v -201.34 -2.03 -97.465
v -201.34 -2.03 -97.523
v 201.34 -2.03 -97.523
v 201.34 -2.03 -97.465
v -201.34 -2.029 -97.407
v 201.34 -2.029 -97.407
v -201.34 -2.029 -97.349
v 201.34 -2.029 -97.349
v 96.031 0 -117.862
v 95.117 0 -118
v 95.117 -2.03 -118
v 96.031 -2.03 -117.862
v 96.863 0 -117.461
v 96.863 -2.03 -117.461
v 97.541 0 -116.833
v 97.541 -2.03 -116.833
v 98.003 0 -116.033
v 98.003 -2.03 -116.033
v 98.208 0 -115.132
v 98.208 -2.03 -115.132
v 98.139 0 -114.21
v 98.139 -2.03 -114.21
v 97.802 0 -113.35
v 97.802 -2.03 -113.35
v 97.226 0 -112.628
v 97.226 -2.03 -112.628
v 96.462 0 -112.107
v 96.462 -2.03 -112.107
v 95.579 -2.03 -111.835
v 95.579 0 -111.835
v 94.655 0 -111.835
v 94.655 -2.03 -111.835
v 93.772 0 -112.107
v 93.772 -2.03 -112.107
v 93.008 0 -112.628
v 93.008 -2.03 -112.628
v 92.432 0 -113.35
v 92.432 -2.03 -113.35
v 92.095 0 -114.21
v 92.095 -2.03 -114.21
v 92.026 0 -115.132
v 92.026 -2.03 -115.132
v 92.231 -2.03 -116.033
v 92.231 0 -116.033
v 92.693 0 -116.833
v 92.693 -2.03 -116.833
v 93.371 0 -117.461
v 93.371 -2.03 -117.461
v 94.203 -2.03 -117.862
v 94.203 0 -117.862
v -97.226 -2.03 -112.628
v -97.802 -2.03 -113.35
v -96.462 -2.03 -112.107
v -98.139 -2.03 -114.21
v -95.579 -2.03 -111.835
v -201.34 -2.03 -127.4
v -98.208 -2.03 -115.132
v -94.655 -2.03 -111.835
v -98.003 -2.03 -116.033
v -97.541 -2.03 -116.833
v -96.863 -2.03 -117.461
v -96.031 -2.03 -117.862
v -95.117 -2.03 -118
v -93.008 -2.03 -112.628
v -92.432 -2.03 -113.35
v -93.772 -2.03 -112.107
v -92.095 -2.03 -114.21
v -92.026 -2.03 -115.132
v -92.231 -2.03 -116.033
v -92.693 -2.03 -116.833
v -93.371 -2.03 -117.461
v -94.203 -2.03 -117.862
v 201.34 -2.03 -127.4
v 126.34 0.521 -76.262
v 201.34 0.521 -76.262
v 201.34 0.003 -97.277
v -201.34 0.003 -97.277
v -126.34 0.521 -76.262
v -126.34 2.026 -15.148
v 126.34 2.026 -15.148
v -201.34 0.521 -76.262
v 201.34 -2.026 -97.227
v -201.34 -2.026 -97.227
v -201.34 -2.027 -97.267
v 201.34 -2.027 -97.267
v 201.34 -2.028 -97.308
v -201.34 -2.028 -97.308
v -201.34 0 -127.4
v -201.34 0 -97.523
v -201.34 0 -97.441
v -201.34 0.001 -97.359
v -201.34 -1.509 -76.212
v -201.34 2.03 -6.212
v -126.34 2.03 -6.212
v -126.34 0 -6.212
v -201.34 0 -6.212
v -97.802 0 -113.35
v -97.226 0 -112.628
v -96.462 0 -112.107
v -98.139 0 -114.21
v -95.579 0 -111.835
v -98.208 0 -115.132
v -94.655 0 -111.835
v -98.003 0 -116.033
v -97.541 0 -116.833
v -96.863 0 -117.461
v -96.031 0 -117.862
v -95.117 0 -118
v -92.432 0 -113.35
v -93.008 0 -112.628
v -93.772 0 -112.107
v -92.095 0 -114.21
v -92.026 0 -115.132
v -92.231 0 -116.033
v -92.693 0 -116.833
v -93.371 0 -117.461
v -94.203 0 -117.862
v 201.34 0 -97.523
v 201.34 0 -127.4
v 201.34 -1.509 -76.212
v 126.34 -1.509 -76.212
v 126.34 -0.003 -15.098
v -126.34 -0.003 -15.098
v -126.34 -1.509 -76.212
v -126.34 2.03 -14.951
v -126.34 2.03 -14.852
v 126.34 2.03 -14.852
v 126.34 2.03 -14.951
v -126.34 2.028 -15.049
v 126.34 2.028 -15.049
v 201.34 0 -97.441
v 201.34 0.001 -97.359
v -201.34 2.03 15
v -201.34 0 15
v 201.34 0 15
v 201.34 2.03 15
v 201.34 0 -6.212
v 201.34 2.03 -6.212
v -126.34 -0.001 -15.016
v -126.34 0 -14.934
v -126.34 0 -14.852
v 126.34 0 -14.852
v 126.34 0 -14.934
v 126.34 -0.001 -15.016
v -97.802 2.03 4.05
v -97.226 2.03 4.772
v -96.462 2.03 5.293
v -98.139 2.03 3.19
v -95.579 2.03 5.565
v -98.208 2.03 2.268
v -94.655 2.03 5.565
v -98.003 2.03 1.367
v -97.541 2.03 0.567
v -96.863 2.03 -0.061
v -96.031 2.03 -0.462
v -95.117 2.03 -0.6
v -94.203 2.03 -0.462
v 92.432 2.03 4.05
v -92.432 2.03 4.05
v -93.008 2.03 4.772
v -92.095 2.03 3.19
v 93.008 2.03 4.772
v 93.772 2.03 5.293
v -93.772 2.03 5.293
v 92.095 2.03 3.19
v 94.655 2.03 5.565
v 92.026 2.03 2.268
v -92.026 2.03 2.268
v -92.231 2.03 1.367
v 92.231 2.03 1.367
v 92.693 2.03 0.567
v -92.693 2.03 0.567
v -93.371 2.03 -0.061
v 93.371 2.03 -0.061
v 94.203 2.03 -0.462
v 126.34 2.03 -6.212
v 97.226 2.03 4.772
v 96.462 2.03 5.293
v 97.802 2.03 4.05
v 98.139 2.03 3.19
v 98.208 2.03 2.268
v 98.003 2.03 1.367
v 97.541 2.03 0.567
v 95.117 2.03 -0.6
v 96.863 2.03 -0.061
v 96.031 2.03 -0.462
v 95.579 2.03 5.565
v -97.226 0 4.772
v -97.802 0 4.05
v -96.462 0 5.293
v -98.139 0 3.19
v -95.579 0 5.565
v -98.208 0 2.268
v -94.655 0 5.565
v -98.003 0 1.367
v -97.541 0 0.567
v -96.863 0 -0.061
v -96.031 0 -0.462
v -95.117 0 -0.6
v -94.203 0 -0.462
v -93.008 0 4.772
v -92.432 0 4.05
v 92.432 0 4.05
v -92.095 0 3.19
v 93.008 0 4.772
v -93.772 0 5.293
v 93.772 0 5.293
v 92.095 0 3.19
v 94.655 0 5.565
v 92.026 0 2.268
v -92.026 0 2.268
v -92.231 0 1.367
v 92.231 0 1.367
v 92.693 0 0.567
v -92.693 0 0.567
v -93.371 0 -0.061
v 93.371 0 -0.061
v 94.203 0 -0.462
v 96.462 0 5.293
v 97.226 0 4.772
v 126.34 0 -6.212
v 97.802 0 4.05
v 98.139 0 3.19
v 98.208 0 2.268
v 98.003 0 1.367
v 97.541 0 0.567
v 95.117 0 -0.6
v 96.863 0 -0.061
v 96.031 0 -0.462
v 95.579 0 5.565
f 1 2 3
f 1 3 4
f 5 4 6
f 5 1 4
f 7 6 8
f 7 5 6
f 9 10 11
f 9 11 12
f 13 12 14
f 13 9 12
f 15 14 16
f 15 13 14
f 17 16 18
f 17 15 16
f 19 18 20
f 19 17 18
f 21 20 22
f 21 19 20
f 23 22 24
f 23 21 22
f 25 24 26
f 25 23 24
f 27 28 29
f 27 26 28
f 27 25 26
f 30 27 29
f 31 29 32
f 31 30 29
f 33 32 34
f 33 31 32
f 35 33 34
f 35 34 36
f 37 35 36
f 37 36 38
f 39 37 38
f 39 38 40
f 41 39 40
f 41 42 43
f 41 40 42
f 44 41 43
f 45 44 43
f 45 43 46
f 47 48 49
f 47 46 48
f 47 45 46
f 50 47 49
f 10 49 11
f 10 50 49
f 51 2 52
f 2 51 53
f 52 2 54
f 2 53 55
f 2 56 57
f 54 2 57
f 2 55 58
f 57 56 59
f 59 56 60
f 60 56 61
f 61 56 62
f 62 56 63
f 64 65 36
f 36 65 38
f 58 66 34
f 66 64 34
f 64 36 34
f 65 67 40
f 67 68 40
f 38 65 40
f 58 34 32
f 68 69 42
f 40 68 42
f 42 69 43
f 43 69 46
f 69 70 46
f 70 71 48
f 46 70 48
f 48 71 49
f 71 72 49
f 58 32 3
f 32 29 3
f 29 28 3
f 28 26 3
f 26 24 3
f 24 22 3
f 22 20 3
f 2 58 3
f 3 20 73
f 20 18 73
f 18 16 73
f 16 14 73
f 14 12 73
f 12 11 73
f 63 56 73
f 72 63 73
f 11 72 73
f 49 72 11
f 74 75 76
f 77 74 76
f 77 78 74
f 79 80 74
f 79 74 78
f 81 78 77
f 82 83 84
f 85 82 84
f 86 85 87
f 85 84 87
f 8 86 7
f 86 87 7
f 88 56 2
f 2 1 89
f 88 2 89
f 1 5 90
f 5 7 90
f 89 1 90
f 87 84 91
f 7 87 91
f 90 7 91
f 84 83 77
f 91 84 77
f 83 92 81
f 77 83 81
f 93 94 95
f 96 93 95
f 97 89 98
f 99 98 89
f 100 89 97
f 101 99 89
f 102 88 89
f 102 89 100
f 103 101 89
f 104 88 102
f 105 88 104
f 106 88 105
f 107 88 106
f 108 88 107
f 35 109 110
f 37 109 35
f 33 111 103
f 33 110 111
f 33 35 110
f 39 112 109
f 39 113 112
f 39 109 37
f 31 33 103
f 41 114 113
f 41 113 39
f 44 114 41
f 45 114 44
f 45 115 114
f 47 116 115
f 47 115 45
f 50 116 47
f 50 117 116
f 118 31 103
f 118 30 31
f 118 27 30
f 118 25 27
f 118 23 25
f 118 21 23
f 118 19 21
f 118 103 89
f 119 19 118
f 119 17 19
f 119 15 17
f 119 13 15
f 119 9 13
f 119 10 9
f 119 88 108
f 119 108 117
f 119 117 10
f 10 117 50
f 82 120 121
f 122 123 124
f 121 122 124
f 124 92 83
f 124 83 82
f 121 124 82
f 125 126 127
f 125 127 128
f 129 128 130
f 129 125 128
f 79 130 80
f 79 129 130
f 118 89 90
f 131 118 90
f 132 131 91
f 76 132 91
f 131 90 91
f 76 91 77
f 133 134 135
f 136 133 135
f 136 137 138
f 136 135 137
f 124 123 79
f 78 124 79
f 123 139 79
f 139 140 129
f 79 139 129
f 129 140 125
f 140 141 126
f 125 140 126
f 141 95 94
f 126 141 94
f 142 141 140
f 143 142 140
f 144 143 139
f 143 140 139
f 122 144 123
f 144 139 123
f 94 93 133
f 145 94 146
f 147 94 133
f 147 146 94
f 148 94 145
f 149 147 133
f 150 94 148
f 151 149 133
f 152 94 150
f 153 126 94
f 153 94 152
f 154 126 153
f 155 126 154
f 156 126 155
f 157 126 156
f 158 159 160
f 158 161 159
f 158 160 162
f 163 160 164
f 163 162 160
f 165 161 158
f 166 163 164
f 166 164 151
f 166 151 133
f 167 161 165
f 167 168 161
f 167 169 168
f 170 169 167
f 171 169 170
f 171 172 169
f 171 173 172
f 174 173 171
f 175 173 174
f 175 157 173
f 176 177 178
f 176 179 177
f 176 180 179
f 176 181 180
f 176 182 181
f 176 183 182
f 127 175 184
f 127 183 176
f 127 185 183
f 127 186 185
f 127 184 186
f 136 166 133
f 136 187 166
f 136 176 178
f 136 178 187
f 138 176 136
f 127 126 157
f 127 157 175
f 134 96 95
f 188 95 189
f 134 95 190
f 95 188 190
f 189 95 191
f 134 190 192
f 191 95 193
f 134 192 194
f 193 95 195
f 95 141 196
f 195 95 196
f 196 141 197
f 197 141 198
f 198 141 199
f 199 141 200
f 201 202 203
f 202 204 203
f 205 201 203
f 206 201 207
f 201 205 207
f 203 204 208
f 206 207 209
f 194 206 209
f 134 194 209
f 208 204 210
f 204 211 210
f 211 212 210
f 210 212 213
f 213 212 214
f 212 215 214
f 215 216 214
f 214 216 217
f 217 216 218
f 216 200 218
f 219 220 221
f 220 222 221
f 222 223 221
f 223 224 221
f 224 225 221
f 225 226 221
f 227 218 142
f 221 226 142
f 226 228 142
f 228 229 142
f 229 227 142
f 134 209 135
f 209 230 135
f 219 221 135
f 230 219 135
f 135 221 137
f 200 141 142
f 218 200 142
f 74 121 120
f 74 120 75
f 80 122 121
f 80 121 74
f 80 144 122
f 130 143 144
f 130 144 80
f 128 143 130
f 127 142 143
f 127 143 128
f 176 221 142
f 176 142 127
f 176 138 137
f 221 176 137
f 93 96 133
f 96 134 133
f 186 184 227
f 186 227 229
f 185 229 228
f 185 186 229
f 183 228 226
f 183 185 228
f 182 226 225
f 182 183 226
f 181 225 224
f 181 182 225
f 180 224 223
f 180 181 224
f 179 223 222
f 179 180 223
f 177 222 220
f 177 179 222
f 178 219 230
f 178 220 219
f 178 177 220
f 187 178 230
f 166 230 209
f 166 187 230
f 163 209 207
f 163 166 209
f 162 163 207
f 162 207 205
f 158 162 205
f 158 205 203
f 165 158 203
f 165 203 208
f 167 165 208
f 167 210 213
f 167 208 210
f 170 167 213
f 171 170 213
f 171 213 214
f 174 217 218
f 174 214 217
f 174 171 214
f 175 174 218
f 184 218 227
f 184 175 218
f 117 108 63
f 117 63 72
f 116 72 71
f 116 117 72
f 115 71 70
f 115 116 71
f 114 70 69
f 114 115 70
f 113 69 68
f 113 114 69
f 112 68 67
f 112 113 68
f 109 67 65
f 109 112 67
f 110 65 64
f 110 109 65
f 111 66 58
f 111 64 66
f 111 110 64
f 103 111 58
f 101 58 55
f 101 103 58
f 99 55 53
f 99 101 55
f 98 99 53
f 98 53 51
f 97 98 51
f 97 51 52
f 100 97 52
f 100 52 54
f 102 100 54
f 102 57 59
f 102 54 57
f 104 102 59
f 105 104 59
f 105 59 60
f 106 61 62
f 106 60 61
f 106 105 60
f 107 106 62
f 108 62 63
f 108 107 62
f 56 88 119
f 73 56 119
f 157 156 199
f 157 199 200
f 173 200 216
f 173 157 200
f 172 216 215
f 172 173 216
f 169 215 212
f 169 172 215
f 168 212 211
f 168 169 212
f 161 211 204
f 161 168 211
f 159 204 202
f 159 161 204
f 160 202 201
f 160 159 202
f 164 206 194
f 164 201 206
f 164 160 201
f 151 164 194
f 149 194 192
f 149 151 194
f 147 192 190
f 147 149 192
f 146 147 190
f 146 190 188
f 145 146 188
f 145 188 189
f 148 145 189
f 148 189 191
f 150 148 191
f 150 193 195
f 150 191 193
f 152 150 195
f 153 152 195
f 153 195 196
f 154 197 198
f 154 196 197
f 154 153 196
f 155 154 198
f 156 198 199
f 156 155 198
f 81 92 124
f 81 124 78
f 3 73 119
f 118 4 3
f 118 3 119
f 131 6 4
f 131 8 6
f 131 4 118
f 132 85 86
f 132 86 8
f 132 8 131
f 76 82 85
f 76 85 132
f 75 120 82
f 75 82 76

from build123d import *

# Parameters (mm, degrees)
SKETCH1_W               = 402.68
SKETCH1_H               = 30
BOSS_EXTRUDE1_DEPTH     = 2.03
SKETCH2_W               = 402.68
SKETCH2_H               = 30
BOSS_EXTRUDE2_DEPTH     = 2.03
CONVERT_SOLID1_START    = -201.34
CONVERT_SOLID1_DEPTH    = 402.68
CONVERT_SOLID1_2_DEPTH  = 402.68
CUT_EXTRUDE1_START      = -201.34
CUT_EXTRUDE1_DEPTH      = 75
CUT_EXTRUDE1_START_2    = 126.34
CUT_EXTRUDE1_2_DEPTH    = 75
CUT_EXTRUDE2_DEPTH      = 239.296116766
CUT_EXTRUDE2_DEPTH_BACK = 239.296116766
SKETCH8_R               = 3.1
CUT_EXTRUDE3_DEPTH      = 239.27017557
CUT_EXTRUDE3_DEPTH_BACK = 239.27017557
SKETCH10_R              = 3.1


# Read off the part's stored shape, not the designer's step: Convert-Solid1, Cut-Extrude1
with BuildPart() as part:
    # Sketch1 → Boss-Extrude1 (new body)
    with BuildSketch(Plane(origin=(0, 0, 0), x_dir=(1, 0, 0), z_dir=(0, 1, 0))):
        Rectangle(SKETCH1_W, SKETCH1_H)
    extrude(amount=BOSS_EXTRUDE1_DEPTH)


with BuildPart() as body_2:
    # Sketch2 → Boss-Extrude2 (new body)
    with BuildSketch(Plane(origin=(0, 0, 0), x_dir=(1, 0, 0), z_dir=(0, 1, 0))):
        with Locations((0, 112.4)):
            Rectangle(SKETCH2_W, SKETCH2_H)
    extrude(amount=-BOSS_EXTRUDE2_DEPTH)


    add(part.part)  # loft1 joins it to this body
    # loft from a face of the part (loft1)
    loft([body_2.faces().sort_by_distance((0, -1.015, -97.4))[0], body_2.faces().sort_by_distance((0, 1.015, -15))[0]])

    # Convert-Solid1 outline → Convert-Solid1 (cut)
    with BuildSketch(Plane.YZ.offset(CONVERT_SOLID1_START)):
        with BuildLine():
            ThreePointArc((2.03, -14.851837405), (2.029087712, -14.999988764), (2.026350985, -15.148117654))
            Line((2.026350985, -15.148117654), (2.03, -15))
            Line((2.03, -15), (2.03, -14.851837405))
        make_face()
        with BuildLine():
            ThreePointArc((-2.03, -97.523160927), (-2.029683266, -97.435865309), (-2.02873308, -97.348574287))
            Line((-2.02873308, -97.348574287), (-2.03, -97.4))
            Line((-2.03, -97.4), (-2.03, -97.523160927))
        make_face()
    extrude(amount=CONVERT_SOLID1_DEPTH, mode=Mode.SUBTRACT)

    # Convert-Solid1 2 outline → Convert-Solid1 2 (add)
    with BuildSketch(Plane.YZ.offset(CONVERT_SOLID1_START)):
        with BuildLine():
            Line((0, -97.4), (0, -97.523160927))
            ThreePointArc((0, -97.523160927), (0.000758344, -97.40000934), (0.003033263, -97.276876431))
            Line((0.003033263, -97.276876431), (0, -97.4))
        make_face()
        with BuildLine():
            ThreePointArc((0, -14.851837405), (-0.000758344, -14.974988992), (-0.003033263, -15.098121901))
            Line((-0.003033263, -15.098121901), (-2.026350985, -97.226880678))
            ThreePointArc((-2.026350985, -97.226880678), (-2.027695942, -97.28772447), (-2.02873308, -97.348574287))
            Line((-2.02873308, -97.348574287), (0, -15))
            Line((0, -15), (0, -14.851837405))
        make_face()
    extrude(amount=CONVERT_SOLID1_2_DEPTH)

    # Cut-Extrude1 outline → Cut-Extrude1 (cut)
    with BuildSketch(Plane.YZ.offset(CUT_EXTRUDE1_START)):
        with BuildLine():
            Line((-0.003033263, -15.098121901), (-1.508642262, -76.212497042))
            Line((-1.508642262, -76.212497042), (0.520741986, -76.262492795))
            Line((0.520741986, -76.262492795), (2.026350985, -15.148117654))
            ThreePointArc((2.026350985, -15.148117654), (2.029087712, -14.999988764), (2.03, -14.851837405))
            Line((2.03, -14.851837405), (2.03, -6.212497042))
            Line((2.03, -6.212497042), (0, -6.212497042))
            Line((0, -6.212497042), (0, -14.851837405))
            ThreePointArc((0, -14.851837405), (-0.000758344, -14.974988992), (-0.003033263, -15.098121901))
        make_face()
    extrude(amount=CUT_EXTRUDE1_DEPTH, mode=Mode.SUBTRACT)

    # Cut-Extrude1 2 outline → Cut-Extrude1 2 (cut)
    with BuildSketch(Plane.YZ.offset(CUT_EXTRUDE1_START_2)):
        with BuildLine():
            Line((-0.003033263, -15.098121901), (-1.508642262, -76.212497042))
            Line((-1.508642262, -76.212497042), (0.520741986, -76.262492795))
            Line((0.520741986, -76.262492795), (2.026350985, -15.148117654))
            ThreePointArc((2.026350985, -15.148117654), (2.029087712, -14.999988764), (2.03, -14.851837405))
            Line((2.03, -14.851837405), (2.03, -6.212497042))
            Line((2.03, -6.212497042), (0, -6.212497042))
            Line((0, -6.212497042), (0, -14.851837405))
            ThreePointArc((0, -14.851837405), (-0.000758344, -14.974988992), (-0.003033263, -15.098121901))
        make_face()
    extrude(amount=CUT_EXTRUDE1_2_DEPTH, mode=Mode.SUBTRACT)

    # Sketch8 → Cut-Extrude2 (cut, two sides: drawn at the far end of the back side and taken through both)
    with BuildSketch(Plane.XZ.offset(2.03).offset(-CUT_EXTRUDE2_DEPTH_BACK)):
        with Locations(Location((95.117, -114.9, 0), (0, 0, 270))):
            Circle(SKETCH8_R)
        with Locations(Location((-95.117, -114.9, 0), (0, 0, 270))):
            Circle(SKETCH8_R)
    extrude(amount=CUT_EXTRUDE2_DEPTH + CUT_EXTRUDE2_DEPTH_BACK, mode=Mode.SUBTRACT)

    # Sketch10 → Cut-Extrude3 (cut, two sides: drawn at the far end of the back side and taken through both)
    with BuildSketch(Plane.XZ.offset(-CUT_EXTRUDE3_DEPTH_BACK)):
        with Locations(Location((95.116996944, 2.5, 0), (0, 0, 270))):
            Circle(SKETCH10_R)
        with Locations(Location((-95.117, 2.5, 0), (0, 0, 270))):
            Circle(SKETCH10_R)
    extrude(amount=CUT_EXTRUDE3_DEPTH + CUT_EXTRUDE3_DEPTH_BACK, mode=Mode.SUBTRACT)


solid = body_2.part
